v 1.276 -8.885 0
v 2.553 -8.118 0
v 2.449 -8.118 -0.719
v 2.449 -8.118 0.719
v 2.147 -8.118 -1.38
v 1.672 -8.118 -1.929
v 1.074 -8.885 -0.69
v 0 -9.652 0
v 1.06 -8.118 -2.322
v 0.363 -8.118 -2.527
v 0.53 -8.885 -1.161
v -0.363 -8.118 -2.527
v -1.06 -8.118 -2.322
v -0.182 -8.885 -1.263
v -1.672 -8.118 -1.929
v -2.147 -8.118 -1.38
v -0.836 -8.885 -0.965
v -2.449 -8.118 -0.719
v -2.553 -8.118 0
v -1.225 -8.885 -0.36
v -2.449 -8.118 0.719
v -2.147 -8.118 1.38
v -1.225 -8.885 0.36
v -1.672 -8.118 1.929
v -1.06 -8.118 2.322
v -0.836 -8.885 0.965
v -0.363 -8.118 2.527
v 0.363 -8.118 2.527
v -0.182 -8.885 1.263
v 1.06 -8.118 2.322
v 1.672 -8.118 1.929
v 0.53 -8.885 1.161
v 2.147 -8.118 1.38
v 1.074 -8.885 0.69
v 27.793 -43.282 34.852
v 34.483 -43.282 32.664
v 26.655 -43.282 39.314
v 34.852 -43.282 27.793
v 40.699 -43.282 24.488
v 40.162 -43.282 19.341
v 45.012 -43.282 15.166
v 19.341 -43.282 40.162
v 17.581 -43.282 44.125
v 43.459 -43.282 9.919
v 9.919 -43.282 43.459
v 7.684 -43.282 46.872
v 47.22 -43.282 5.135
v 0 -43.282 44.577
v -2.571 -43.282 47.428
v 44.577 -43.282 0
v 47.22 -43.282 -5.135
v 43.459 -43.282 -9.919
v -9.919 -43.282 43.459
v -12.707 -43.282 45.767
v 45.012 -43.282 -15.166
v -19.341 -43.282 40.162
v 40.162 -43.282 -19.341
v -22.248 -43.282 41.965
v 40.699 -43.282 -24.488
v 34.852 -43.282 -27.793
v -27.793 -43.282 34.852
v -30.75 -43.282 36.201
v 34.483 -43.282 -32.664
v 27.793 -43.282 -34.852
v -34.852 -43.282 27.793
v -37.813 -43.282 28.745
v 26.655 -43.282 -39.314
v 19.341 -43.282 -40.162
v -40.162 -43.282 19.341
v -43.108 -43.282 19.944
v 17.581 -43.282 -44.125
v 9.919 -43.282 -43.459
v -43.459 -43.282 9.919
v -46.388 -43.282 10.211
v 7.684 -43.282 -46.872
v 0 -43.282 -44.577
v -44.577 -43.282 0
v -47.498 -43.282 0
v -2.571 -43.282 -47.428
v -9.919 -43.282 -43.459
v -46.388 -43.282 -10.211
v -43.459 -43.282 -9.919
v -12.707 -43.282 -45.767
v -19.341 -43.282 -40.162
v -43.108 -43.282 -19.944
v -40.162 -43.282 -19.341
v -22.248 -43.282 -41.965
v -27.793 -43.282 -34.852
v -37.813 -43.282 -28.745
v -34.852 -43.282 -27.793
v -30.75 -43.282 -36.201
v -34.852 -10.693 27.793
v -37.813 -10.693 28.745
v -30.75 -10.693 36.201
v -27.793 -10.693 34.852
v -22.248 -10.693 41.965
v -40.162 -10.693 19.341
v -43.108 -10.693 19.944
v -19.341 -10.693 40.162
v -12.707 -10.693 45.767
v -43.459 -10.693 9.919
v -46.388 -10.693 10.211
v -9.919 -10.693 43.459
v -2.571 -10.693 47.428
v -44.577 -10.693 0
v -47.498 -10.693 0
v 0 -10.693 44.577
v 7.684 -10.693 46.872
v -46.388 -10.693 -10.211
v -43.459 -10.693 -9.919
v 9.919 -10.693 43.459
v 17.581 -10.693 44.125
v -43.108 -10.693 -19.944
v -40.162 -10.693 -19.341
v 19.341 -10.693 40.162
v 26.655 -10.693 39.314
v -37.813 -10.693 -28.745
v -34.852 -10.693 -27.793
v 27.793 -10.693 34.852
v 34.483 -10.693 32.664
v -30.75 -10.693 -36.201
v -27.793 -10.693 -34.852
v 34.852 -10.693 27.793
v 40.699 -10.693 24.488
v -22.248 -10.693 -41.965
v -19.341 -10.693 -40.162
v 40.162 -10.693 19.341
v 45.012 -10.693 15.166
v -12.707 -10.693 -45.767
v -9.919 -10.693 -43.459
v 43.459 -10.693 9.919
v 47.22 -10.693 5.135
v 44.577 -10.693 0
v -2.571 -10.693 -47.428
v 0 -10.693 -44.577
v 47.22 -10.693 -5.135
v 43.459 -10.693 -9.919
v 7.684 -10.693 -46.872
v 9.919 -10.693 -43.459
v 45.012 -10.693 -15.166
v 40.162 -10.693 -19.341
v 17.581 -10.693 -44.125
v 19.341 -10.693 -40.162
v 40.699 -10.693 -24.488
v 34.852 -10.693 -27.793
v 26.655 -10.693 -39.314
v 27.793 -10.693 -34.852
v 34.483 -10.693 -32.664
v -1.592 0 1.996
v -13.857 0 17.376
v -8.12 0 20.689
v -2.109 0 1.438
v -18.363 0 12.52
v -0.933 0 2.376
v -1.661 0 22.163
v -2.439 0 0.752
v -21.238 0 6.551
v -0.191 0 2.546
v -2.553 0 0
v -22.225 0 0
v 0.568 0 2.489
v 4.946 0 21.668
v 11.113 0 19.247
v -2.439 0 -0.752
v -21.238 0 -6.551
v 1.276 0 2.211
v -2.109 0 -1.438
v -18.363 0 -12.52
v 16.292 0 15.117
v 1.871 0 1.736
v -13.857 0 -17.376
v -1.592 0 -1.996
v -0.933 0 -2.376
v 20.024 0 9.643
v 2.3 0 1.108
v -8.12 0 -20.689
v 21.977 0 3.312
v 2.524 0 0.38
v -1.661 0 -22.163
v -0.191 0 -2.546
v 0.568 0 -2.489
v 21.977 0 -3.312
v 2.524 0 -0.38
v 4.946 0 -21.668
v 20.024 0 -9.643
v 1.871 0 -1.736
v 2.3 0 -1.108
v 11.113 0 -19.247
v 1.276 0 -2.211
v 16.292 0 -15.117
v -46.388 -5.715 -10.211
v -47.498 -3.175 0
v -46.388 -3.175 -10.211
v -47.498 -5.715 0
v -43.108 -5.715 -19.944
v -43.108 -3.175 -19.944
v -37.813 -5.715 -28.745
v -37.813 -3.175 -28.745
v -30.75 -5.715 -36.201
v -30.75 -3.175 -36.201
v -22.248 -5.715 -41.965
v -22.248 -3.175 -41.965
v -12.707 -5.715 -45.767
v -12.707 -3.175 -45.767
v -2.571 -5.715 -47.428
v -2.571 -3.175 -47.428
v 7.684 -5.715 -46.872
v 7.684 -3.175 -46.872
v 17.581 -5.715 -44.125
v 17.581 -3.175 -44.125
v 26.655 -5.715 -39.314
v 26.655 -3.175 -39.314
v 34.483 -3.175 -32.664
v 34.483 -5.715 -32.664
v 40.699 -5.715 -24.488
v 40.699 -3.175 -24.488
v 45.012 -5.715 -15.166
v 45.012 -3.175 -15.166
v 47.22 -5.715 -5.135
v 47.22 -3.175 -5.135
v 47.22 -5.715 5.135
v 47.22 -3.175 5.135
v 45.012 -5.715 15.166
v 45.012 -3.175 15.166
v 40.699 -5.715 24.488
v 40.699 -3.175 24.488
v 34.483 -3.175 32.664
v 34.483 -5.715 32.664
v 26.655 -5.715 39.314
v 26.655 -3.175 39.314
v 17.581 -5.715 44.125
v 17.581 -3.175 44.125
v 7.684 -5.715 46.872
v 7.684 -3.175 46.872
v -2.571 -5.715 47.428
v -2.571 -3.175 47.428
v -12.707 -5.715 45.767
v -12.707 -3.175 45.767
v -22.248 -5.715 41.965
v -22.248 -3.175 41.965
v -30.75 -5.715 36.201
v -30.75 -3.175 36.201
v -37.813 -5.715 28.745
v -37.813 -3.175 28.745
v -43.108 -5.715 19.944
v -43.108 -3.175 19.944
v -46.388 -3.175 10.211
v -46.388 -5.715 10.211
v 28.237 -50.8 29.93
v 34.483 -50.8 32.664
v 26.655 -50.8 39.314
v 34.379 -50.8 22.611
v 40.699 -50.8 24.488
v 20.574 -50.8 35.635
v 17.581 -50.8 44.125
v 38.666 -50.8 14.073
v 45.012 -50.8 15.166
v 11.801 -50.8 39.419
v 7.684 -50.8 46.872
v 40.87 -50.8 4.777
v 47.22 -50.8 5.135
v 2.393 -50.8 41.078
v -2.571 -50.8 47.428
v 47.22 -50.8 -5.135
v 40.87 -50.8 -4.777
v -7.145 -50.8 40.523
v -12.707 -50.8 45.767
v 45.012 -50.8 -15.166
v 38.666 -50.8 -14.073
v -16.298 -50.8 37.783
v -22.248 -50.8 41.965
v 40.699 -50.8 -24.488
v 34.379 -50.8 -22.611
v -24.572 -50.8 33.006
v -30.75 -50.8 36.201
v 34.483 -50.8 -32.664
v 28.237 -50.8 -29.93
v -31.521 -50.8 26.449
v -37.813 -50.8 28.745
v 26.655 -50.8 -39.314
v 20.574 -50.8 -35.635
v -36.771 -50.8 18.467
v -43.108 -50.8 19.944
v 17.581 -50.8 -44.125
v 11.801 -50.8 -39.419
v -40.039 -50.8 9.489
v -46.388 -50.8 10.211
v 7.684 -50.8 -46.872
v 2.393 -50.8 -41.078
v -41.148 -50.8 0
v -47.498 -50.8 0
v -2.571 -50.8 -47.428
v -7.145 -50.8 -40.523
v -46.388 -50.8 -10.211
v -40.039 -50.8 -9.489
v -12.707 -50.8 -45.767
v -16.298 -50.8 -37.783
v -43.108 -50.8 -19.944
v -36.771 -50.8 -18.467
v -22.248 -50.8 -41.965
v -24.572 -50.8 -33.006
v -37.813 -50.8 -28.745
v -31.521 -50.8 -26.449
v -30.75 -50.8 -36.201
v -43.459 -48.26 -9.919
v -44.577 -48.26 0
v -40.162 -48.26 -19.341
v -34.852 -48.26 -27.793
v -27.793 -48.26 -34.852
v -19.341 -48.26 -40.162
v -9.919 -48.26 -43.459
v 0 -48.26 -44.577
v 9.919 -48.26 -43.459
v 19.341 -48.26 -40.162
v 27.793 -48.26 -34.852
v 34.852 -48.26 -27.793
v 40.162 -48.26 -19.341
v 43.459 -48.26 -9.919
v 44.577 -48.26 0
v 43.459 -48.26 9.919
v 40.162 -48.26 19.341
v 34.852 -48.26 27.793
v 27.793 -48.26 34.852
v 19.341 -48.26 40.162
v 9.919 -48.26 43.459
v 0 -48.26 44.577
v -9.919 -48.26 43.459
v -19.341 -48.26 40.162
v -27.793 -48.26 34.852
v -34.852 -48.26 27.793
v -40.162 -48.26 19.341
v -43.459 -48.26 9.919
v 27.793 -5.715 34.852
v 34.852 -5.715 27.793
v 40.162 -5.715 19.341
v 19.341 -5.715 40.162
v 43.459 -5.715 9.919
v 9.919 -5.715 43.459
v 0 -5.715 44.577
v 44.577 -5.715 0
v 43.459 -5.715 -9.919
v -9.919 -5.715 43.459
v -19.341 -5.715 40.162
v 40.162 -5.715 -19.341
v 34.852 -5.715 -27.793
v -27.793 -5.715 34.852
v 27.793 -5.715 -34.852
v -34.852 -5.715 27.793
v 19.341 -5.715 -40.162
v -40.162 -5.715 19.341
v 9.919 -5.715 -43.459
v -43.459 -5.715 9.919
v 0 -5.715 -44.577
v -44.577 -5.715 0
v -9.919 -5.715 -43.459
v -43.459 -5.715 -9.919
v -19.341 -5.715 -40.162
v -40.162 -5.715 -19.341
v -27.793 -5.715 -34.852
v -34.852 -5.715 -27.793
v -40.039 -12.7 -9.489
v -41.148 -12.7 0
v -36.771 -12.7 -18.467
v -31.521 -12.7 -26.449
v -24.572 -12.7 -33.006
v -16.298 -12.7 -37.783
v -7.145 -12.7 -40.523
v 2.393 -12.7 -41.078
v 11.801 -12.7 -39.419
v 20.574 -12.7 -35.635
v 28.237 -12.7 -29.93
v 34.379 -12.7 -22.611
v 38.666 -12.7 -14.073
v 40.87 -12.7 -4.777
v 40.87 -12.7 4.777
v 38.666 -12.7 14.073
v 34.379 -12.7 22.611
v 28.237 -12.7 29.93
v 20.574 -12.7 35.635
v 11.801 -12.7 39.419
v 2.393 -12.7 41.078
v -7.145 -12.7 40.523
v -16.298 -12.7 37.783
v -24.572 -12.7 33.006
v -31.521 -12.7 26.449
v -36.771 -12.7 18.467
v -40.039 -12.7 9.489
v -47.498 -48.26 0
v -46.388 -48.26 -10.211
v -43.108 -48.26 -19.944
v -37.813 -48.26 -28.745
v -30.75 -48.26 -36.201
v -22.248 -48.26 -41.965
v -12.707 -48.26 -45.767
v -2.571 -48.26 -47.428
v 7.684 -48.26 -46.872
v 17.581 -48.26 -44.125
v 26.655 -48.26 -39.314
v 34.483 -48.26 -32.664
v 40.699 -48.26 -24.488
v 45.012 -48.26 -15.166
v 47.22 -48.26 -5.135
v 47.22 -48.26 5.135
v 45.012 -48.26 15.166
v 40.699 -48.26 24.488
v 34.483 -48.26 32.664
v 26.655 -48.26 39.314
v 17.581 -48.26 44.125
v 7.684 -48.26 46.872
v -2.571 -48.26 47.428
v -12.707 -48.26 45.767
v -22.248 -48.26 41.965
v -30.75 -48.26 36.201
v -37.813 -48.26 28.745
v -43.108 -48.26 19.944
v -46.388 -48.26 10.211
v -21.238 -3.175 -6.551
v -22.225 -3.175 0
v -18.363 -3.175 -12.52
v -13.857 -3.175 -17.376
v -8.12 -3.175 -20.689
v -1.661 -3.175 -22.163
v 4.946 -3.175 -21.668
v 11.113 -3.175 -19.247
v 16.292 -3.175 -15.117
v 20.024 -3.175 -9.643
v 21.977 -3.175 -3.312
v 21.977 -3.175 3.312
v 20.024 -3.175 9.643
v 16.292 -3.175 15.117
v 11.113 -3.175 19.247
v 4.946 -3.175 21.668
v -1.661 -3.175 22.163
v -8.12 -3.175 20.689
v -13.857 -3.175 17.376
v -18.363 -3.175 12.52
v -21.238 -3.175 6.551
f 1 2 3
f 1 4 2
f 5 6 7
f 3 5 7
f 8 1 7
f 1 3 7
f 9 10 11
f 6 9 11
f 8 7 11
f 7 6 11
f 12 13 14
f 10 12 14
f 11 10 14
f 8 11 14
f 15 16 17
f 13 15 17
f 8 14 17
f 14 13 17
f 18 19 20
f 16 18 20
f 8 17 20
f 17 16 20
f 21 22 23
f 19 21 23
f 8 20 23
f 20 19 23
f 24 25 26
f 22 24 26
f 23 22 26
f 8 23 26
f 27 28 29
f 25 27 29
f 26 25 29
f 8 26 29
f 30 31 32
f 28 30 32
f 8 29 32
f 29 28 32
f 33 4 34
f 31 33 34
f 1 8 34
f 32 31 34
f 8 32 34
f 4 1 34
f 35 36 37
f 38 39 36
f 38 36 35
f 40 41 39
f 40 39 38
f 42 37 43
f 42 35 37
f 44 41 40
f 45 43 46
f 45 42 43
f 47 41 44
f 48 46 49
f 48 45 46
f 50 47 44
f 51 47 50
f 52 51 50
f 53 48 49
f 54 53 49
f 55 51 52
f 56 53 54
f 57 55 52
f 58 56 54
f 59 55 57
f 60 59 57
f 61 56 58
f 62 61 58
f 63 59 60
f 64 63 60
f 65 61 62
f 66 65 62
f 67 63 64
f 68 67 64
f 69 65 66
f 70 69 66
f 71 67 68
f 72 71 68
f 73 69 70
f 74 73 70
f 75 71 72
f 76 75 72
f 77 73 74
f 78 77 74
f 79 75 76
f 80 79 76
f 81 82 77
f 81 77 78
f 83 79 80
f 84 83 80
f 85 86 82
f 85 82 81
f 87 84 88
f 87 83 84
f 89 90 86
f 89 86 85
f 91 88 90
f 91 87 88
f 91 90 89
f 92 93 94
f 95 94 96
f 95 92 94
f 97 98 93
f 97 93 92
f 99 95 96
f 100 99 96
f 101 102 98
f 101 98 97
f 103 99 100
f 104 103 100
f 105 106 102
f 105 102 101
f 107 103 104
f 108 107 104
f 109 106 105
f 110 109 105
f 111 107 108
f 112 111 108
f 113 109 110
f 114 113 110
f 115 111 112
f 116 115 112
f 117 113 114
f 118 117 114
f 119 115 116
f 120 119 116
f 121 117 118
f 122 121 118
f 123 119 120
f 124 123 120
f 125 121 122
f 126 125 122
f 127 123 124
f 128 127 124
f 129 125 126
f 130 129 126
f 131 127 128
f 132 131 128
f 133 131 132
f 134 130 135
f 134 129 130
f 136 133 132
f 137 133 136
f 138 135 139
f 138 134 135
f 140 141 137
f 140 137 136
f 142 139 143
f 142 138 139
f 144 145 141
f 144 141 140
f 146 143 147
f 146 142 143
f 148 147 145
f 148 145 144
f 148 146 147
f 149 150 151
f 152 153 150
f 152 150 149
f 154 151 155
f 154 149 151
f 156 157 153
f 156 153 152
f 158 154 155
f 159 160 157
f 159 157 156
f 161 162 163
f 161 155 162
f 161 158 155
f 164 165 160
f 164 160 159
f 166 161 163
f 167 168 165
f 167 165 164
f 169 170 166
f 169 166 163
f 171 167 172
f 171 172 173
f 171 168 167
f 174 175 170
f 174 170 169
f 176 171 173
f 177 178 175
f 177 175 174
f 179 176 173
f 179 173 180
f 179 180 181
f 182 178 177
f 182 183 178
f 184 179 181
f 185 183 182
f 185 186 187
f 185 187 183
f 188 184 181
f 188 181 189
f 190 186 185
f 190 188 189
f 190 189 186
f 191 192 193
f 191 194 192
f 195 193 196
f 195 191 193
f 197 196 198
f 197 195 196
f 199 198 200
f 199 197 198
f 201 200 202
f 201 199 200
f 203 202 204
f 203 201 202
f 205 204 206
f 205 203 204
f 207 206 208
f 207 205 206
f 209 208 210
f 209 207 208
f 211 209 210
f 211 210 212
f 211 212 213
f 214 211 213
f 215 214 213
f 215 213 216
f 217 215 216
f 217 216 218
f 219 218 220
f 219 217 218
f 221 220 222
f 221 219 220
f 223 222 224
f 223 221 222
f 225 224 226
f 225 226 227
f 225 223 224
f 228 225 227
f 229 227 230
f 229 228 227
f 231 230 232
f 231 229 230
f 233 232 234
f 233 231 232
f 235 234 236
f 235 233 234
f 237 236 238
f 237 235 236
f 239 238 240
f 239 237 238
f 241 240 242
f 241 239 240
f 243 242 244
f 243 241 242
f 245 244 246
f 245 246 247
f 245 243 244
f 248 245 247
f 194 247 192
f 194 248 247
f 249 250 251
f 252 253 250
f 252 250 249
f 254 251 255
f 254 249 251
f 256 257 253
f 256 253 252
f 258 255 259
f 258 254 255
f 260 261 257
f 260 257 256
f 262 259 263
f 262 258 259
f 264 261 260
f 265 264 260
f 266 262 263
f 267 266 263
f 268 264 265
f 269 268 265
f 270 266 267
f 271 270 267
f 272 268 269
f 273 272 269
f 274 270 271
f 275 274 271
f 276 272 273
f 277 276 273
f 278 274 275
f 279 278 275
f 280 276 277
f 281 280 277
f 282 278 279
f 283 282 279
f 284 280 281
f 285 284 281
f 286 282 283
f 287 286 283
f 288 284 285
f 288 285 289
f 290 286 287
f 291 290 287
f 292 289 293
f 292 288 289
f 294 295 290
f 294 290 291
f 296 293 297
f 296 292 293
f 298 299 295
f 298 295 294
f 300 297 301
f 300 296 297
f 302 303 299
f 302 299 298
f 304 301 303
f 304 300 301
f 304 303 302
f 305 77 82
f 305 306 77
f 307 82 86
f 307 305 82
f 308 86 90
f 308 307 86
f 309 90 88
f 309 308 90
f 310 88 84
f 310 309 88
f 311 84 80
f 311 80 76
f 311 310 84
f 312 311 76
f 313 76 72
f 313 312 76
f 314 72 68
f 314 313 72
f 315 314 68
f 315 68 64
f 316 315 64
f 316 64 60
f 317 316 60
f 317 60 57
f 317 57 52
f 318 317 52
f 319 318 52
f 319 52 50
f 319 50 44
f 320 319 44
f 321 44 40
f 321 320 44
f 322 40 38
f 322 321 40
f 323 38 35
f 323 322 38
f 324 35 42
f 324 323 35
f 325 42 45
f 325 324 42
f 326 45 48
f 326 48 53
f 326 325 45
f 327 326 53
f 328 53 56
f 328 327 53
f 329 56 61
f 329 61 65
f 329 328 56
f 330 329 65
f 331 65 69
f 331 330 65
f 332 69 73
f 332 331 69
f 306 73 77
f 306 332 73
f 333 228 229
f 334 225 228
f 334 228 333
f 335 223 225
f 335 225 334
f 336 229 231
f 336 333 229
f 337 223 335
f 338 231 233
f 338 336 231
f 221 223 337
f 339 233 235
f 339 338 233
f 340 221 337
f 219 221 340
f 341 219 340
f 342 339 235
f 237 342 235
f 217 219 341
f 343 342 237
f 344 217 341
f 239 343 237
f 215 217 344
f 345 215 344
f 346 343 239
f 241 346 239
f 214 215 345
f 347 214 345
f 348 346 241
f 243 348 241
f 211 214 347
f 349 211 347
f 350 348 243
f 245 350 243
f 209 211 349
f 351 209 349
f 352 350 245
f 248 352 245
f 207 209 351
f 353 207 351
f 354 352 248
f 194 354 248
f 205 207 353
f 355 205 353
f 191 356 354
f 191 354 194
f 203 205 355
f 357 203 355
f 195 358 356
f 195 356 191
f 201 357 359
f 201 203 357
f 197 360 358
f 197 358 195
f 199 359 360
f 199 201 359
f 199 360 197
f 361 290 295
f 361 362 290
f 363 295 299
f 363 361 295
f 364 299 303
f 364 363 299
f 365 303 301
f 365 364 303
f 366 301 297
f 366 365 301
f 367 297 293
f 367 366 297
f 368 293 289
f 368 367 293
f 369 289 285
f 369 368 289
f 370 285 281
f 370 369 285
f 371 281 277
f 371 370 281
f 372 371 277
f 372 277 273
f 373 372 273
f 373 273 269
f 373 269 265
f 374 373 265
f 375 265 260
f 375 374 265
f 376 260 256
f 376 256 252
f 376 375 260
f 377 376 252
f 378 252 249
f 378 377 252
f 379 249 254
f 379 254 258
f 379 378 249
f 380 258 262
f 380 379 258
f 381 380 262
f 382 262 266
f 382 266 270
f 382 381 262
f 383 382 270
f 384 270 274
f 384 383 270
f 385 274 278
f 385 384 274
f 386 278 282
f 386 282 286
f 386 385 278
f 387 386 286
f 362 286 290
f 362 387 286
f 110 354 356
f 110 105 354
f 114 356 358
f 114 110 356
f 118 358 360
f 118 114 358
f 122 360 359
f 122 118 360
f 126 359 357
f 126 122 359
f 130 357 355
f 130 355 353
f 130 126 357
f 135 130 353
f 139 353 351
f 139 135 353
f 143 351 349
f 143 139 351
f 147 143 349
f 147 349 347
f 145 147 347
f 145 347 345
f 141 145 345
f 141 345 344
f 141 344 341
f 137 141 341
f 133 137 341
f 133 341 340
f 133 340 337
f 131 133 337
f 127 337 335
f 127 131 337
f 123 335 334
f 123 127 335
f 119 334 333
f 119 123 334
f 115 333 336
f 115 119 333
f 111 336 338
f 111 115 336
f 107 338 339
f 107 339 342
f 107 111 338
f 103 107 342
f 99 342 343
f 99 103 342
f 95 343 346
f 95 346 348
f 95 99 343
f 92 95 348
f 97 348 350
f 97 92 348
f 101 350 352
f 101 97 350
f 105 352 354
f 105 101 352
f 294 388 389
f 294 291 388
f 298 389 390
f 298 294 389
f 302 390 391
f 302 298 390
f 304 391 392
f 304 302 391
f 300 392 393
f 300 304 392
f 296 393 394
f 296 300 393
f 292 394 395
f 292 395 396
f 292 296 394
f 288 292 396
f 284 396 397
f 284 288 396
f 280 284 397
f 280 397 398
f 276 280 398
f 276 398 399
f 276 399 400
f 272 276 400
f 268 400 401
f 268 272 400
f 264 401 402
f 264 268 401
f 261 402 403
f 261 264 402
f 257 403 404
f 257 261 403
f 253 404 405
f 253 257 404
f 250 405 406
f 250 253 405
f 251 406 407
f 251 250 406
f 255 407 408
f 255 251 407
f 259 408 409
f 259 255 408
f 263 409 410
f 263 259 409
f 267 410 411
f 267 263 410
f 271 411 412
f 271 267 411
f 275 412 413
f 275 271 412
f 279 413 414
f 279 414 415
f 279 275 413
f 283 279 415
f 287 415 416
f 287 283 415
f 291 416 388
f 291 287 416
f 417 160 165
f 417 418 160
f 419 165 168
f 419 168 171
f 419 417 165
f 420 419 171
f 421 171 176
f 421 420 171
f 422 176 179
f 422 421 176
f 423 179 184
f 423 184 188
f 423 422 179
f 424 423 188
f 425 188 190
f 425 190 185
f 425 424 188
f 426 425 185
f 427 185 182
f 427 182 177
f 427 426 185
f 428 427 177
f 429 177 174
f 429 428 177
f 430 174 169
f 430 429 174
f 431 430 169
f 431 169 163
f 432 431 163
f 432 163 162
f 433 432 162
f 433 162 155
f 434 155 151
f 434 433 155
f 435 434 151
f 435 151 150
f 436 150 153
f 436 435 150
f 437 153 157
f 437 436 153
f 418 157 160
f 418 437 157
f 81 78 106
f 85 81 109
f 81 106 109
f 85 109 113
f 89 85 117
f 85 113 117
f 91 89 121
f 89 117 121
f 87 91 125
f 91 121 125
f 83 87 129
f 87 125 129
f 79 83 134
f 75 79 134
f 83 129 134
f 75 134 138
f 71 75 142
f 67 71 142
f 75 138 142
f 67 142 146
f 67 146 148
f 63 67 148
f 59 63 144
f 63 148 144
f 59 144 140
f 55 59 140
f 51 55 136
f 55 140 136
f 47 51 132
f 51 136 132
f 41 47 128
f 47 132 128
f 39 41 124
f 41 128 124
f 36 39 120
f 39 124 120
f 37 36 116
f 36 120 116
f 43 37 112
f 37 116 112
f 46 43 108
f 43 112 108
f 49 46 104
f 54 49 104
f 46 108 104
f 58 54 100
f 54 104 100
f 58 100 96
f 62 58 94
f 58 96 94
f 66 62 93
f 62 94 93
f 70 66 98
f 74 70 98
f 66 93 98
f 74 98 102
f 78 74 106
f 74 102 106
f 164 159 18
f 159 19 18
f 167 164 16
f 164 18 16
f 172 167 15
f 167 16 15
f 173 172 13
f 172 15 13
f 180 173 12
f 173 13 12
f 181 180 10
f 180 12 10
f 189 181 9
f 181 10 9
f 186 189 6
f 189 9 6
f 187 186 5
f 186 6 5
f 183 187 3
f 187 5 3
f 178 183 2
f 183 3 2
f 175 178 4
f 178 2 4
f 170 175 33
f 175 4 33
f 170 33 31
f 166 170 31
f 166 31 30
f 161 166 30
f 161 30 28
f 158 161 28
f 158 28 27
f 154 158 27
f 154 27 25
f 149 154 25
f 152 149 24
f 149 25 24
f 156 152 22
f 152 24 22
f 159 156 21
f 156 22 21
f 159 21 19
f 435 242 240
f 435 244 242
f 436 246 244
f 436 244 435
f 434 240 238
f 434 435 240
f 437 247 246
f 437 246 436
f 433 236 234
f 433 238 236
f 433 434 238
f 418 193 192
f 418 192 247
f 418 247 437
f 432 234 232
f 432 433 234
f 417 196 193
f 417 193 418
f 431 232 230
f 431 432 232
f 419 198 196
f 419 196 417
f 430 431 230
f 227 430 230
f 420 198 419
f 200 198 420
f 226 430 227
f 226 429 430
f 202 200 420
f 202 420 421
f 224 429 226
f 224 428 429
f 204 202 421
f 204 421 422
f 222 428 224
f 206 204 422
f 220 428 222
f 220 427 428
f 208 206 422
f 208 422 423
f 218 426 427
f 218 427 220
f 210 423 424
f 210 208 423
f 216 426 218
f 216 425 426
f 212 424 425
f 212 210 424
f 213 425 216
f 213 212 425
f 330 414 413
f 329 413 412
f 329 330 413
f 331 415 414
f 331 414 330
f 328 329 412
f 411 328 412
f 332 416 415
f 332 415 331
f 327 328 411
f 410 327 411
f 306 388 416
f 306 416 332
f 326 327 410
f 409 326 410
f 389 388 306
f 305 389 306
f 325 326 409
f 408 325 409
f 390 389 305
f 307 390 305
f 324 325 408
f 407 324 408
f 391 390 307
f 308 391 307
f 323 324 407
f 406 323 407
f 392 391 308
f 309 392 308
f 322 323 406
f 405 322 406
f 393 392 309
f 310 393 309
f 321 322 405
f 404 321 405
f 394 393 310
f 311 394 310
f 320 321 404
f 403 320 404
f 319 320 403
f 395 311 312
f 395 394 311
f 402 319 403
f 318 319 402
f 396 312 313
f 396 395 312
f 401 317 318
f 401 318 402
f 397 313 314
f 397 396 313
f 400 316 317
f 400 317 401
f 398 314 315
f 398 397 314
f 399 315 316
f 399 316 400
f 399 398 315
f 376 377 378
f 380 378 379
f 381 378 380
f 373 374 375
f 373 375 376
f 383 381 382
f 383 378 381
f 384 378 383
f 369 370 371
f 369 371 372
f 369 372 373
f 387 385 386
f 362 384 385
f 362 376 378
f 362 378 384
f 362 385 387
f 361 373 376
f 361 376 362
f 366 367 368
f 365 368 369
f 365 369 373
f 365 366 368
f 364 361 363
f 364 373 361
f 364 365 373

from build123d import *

# Parameters (mm, degrees)
F_1_4_20_TAPPED_HOLE1_D     = 5.1054
F_1_4_20_TAPPED_HOLE1_DEPTH = 8.118183098
F_1_4_20_TAPPED_HOLE1_TIP   = 1.533816902


with BuildPart() as part:
    # Sketch1 → Revolve1 (revolve)
    with BuildSketch(Plane.XY, mode=Mode.PRIVATE) as revolve1_sk:
        Polygon((0, 0), (22.225, 0), (22.225, -3.175), (47.498, -3.175), (47.498, -5.715), (44.577, -5.715), (44.577, -10.6934), (47.498, -10.6934), (47.498, -28.7782), (47.498, -33.7566), (47.498, -43.2816), (44.577, -43.2816), (44.577, -48.26), (47.498, -48.26), (47.498, -50.8), (41.148, -50.8), (41.148, -12.7), (0, -12.7), align=None)
    revolve(revolve1_sk.sketch.rotate(Axis((0, 38.901080227, 0), (0, -1, 0)), 180), axis=Axis((0, 38.901080227, 0), (0, -1, 0)))

    # 1/4-20 Tapped Hole1
    with Locations(Plane(origin=(0, 0, 0), x_dir=(1, 0, 0), z_dir=(0, 1, 0))):
        with Locations((0, 0)):
            Hole(F_1_4_20_TAPPED_HOLE1_D / 2, depth=F_1_4_20_TAPPED_HOLE1_DEPTH)
            with Locations((0, 0, -(F_1_4_20_TAPPED_HOLE1_DEPTH + F_1_4_20_TAPPED_HOLE1_TIP / 2))):  # 118° drill point
                Cone(0, F_1_4_20_TAPPED_HOLE1_D / 2, F_1_4_20_TAPPED_HOLE1_TIP, mode=Mode.SUBTRACT)


solid = part.part
